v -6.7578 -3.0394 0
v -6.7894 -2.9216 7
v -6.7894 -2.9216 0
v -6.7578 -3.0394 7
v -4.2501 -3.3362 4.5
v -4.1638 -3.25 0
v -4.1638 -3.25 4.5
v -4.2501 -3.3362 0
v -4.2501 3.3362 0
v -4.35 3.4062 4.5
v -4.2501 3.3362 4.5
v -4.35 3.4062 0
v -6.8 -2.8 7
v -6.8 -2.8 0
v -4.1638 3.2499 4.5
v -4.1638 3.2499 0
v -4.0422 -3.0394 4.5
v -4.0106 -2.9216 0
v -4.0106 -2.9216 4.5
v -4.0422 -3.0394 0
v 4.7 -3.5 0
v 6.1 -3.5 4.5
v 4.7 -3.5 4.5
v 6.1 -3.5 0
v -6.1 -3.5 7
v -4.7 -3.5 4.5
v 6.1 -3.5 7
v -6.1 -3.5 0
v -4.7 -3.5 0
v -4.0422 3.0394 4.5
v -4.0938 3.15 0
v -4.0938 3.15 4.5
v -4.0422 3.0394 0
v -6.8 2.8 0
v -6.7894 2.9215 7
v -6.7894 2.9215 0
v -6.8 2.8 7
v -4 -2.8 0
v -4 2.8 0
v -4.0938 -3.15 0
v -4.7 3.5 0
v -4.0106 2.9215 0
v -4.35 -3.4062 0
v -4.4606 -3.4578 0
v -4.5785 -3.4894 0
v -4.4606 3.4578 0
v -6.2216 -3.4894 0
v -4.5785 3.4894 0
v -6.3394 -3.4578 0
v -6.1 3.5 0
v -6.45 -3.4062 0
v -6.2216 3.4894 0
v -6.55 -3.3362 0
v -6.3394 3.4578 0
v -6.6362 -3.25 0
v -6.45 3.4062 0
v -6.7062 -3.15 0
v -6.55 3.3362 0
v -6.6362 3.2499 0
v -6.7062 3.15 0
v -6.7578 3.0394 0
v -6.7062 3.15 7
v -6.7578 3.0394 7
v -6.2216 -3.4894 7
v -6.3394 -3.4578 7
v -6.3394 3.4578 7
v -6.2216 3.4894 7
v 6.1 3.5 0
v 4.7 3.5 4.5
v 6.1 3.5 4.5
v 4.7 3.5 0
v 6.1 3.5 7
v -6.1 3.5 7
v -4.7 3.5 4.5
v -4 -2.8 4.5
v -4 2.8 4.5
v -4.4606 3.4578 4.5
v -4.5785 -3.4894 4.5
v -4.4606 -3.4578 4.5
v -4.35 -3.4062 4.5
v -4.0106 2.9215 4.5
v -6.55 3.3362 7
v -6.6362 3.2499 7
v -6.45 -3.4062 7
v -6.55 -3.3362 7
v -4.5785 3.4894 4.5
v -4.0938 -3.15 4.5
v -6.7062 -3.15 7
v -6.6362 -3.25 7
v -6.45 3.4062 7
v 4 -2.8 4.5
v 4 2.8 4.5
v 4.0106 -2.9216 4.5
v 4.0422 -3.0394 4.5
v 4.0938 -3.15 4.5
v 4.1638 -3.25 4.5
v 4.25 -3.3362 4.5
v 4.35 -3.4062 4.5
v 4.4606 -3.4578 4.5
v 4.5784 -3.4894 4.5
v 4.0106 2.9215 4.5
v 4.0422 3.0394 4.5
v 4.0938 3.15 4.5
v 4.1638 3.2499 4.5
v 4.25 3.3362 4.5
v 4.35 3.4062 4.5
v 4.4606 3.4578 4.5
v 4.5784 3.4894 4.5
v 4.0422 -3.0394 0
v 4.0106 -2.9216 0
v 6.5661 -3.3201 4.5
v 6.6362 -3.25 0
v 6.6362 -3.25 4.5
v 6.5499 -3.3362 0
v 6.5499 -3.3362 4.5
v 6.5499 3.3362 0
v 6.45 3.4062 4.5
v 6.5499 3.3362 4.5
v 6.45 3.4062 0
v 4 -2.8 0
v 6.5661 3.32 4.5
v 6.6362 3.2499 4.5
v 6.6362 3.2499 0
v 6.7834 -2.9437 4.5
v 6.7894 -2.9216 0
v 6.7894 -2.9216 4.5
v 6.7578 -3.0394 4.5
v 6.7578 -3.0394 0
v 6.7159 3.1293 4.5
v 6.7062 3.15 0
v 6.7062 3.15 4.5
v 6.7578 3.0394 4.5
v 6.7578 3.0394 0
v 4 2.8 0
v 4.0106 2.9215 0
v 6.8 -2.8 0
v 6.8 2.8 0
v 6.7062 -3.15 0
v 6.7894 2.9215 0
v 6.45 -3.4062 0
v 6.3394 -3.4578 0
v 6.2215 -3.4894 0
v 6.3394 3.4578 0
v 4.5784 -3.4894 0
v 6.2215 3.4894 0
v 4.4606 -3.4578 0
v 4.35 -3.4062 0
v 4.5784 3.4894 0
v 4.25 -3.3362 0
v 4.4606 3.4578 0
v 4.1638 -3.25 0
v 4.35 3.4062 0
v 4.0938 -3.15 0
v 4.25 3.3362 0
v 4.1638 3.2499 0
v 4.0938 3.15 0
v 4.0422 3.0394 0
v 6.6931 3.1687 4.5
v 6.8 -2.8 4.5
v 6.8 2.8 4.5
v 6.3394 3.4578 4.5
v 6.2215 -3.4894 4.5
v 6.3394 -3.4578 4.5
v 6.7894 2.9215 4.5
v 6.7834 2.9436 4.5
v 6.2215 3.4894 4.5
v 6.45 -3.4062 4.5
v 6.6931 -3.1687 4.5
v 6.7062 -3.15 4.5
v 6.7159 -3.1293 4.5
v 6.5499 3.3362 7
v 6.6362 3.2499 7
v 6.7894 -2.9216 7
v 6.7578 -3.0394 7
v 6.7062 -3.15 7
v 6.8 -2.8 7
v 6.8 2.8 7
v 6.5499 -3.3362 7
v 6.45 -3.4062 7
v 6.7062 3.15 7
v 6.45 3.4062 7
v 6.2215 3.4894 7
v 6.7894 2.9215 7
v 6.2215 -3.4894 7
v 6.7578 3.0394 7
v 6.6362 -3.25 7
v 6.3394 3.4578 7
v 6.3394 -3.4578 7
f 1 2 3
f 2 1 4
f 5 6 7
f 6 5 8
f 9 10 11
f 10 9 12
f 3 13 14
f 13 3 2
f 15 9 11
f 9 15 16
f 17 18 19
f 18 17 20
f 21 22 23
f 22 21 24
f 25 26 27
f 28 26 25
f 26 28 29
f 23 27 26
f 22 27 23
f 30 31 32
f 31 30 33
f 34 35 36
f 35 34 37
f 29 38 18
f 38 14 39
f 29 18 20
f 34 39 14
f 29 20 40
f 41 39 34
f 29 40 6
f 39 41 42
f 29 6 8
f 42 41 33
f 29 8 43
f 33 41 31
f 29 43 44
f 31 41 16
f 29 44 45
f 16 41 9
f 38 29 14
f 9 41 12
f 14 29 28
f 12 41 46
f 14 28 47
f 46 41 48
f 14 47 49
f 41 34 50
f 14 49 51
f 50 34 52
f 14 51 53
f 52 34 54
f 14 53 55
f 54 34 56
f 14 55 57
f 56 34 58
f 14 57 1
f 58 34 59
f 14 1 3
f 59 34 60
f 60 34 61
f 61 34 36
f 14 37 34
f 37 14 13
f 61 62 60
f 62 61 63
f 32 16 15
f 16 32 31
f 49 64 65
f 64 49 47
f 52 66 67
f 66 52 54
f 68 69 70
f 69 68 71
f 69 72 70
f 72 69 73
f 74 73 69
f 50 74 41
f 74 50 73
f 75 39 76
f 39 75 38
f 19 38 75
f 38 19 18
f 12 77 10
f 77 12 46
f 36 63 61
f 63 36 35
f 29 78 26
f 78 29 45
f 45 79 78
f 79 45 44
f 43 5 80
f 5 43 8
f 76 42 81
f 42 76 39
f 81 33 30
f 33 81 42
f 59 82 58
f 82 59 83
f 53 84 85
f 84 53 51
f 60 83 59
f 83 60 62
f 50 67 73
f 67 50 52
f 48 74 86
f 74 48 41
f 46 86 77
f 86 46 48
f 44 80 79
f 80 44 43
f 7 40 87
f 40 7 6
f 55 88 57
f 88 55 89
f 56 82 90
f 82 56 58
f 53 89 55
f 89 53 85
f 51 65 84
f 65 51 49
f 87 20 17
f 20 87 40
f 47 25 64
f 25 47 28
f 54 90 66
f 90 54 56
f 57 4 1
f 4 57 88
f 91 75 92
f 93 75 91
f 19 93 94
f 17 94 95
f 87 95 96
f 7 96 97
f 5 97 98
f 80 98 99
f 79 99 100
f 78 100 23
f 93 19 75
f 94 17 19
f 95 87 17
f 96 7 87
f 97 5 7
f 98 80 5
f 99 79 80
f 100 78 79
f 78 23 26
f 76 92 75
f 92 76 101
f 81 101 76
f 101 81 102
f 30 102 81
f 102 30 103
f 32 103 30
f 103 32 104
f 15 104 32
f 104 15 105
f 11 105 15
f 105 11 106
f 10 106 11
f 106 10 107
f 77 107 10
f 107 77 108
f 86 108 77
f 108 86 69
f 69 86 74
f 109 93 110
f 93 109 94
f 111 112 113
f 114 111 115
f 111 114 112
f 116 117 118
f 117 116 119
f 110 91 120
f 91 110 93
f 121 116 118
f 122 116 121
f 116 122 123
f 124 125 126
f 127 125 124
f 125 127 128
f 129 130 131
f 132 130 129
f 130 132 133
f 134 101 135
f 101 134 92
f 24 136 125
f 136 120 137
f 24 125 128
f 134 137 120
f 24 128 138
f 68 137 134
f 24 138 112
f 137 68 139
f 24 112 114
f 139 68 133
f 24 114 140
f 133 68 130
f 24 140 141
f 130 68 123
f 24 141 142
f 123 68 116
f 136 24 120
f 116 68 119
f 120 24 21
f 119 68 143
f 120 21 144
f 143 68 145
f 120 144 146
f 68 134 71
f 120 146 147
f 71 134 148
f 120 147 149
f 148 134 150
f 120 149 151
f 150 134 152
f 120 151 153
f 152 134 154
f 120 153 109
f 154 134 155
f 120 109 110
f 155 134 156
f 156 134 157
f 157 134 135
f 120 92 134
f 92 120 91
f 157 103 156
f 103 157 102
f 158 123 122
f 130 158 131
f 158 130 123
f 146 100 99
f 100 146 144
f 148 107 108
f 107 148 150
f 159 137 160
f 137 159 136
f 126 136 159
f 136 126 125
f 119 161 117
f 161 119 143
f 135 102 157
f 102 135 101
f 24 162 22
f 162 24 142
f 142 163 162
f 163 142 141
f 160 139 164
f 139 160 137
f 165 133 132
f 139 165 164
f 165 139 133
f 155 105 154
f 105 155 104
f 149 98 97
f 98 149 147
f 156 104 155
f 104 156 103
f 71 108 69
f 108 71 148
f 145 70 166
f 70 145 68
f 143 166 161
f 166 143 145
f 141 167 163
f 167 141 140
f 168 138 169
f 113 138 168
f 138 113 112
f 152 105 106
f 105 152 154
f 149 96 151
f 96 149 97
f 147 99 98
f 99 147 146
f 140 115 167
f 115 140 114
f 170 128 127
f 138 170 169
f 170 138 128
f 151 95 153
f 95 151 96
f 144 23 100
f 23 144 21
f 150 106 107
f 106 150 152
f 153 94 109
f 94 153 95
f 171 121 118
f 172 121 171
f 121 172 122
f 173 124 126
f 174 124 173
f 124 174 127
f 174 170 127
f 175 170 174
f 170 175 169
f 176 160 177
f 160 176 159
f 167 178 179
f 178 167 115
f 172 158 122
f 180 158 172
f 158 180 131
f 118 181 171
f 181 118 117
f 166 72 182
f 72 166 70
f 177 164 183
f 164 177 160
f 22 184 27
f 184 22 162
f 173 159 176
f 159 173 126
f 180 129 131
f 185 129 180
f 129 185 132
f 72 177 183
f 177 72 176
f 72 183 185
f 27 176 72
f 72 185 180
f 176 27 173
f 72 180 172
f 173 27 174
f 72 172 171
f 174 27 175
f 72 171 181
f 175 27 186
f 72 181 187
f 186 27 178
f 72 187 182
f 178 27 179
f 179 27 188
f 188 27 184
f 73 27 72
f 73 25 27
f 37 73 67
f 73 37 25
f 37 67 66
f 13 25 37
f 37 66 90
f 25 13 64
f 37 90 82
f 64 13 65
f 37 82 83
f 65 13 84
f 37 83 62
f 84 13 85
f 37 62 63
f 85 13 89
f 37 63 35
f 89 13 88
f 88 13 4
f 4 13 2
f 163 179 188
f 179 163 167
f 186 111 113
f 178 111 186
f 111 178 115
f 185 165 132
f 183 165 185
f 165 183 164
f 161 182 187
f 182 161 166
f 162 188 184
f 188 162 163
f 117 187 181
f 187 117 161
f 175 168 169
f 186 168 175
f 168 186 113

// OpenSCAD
// Serviceable cable-tie saddle pattern.
// The tunnel is visible and reachable from above after nearby hardware is installed.

$fn = 36;

zip_tie_band_width = 4.0;
zip_tie_band_thickness = 1.4;
zip_tie_tunnel_clear_width = 5.5;
zip_tie_tunnel_clear_height = 3.0;
zip_tie_bridge_top_height = 7.0;
zip_tie_bridge_thickness = 2.5;
zip_tie_bridge_span = 8.0;
zip_tie_bridge_length_along_y = 7.0;
zip_tie_foot_width = 2.8;
zip_tie_foot_length = 7.0;
show_previews = true;

function saddle_total_width() = zip_tie_bridge_span + 2 * zip_tie_foot_width;

module rounded_rect_2d(w, d, r) {
    rr = max(0.01, min(r, min(w, d) / 2 - 0.01));
    hull() for (x = [rr, w - rr]) for (y = [rr, d - rr])
        translate([x, y]) circle(r = rr);
}

module rounded_block(size, r = 0.8) {
    linear_extrude(height = size[2])
        rounded_rect_2d(size[0], size[1], r);
}

module saddle_tunnel_cut() {
    translate([
        -zip_tie_tunnel_clear_width / 2,
        -zip_tie_foot_length / 2 - 0.35,
        -0.02
    ])
        cube([
            zip_tie_tunnel_clear_width,
            zip_tie_foot_length + 0.7,
            zip_tie_tunnel_clear_height + 0.04
        ]);
}

module serviceable_cable_tie_saddle() {
    total_x = saddle_total_width();
    bridge_bottom = zip_tie_bridge_top_height - zip_tie_bridge_thickness;
    foot_h = max(zip_tie_tunnel_clear_height, bridge_bottom);
    foot_y = max(zip_tie_foot_length, zip_tie_bridge_length_along_y);

    difference() {
        union() {
            translate([-total_x / 2, -foot_y / 2, 0])
                rounded_block([zip_tie_foot_width, foot_y, foot_h], 0.7);
            translate([total_x / 2 - zip_tie_foot_width, -foot_y / 2, 0])
                rounded_block([zip_tie_foot_width, foot_y, foot_h], 0.7);
            translate([-total_x / 2, -zip_tie_bridge_length_along_y / 2, bridge_bottom])
                rounded_block([total_x, zip_tie_bridge_length_along_y, zip_tie_bridge_thickness], 0.7);
        }
        saddle_tunnel_cut();
    }
}

module previews() {
    if (show_previews) {
        %color([0, 0.8, 1, 0.35])
            translate([-zip_tie_band_width / 2, -zip_tie_bridge_length_along_y / 2 - 1.3, 0.25])
                cube([zip_tie_band_width, zip_tie_bridge_length_along_y + 2.6, zip_tie_band_thickness]);
        %color([1, 0.35, 0, 0.3])
            translate([0, 0, zip_tie_bridge_top_height + 2])
                rotate([0, 90, 0])
                    cylinder(h = saddle_total_width() + 3, d = 4, center = true);
    }
}

serviceable_cable_tie_saddle();
previews();
